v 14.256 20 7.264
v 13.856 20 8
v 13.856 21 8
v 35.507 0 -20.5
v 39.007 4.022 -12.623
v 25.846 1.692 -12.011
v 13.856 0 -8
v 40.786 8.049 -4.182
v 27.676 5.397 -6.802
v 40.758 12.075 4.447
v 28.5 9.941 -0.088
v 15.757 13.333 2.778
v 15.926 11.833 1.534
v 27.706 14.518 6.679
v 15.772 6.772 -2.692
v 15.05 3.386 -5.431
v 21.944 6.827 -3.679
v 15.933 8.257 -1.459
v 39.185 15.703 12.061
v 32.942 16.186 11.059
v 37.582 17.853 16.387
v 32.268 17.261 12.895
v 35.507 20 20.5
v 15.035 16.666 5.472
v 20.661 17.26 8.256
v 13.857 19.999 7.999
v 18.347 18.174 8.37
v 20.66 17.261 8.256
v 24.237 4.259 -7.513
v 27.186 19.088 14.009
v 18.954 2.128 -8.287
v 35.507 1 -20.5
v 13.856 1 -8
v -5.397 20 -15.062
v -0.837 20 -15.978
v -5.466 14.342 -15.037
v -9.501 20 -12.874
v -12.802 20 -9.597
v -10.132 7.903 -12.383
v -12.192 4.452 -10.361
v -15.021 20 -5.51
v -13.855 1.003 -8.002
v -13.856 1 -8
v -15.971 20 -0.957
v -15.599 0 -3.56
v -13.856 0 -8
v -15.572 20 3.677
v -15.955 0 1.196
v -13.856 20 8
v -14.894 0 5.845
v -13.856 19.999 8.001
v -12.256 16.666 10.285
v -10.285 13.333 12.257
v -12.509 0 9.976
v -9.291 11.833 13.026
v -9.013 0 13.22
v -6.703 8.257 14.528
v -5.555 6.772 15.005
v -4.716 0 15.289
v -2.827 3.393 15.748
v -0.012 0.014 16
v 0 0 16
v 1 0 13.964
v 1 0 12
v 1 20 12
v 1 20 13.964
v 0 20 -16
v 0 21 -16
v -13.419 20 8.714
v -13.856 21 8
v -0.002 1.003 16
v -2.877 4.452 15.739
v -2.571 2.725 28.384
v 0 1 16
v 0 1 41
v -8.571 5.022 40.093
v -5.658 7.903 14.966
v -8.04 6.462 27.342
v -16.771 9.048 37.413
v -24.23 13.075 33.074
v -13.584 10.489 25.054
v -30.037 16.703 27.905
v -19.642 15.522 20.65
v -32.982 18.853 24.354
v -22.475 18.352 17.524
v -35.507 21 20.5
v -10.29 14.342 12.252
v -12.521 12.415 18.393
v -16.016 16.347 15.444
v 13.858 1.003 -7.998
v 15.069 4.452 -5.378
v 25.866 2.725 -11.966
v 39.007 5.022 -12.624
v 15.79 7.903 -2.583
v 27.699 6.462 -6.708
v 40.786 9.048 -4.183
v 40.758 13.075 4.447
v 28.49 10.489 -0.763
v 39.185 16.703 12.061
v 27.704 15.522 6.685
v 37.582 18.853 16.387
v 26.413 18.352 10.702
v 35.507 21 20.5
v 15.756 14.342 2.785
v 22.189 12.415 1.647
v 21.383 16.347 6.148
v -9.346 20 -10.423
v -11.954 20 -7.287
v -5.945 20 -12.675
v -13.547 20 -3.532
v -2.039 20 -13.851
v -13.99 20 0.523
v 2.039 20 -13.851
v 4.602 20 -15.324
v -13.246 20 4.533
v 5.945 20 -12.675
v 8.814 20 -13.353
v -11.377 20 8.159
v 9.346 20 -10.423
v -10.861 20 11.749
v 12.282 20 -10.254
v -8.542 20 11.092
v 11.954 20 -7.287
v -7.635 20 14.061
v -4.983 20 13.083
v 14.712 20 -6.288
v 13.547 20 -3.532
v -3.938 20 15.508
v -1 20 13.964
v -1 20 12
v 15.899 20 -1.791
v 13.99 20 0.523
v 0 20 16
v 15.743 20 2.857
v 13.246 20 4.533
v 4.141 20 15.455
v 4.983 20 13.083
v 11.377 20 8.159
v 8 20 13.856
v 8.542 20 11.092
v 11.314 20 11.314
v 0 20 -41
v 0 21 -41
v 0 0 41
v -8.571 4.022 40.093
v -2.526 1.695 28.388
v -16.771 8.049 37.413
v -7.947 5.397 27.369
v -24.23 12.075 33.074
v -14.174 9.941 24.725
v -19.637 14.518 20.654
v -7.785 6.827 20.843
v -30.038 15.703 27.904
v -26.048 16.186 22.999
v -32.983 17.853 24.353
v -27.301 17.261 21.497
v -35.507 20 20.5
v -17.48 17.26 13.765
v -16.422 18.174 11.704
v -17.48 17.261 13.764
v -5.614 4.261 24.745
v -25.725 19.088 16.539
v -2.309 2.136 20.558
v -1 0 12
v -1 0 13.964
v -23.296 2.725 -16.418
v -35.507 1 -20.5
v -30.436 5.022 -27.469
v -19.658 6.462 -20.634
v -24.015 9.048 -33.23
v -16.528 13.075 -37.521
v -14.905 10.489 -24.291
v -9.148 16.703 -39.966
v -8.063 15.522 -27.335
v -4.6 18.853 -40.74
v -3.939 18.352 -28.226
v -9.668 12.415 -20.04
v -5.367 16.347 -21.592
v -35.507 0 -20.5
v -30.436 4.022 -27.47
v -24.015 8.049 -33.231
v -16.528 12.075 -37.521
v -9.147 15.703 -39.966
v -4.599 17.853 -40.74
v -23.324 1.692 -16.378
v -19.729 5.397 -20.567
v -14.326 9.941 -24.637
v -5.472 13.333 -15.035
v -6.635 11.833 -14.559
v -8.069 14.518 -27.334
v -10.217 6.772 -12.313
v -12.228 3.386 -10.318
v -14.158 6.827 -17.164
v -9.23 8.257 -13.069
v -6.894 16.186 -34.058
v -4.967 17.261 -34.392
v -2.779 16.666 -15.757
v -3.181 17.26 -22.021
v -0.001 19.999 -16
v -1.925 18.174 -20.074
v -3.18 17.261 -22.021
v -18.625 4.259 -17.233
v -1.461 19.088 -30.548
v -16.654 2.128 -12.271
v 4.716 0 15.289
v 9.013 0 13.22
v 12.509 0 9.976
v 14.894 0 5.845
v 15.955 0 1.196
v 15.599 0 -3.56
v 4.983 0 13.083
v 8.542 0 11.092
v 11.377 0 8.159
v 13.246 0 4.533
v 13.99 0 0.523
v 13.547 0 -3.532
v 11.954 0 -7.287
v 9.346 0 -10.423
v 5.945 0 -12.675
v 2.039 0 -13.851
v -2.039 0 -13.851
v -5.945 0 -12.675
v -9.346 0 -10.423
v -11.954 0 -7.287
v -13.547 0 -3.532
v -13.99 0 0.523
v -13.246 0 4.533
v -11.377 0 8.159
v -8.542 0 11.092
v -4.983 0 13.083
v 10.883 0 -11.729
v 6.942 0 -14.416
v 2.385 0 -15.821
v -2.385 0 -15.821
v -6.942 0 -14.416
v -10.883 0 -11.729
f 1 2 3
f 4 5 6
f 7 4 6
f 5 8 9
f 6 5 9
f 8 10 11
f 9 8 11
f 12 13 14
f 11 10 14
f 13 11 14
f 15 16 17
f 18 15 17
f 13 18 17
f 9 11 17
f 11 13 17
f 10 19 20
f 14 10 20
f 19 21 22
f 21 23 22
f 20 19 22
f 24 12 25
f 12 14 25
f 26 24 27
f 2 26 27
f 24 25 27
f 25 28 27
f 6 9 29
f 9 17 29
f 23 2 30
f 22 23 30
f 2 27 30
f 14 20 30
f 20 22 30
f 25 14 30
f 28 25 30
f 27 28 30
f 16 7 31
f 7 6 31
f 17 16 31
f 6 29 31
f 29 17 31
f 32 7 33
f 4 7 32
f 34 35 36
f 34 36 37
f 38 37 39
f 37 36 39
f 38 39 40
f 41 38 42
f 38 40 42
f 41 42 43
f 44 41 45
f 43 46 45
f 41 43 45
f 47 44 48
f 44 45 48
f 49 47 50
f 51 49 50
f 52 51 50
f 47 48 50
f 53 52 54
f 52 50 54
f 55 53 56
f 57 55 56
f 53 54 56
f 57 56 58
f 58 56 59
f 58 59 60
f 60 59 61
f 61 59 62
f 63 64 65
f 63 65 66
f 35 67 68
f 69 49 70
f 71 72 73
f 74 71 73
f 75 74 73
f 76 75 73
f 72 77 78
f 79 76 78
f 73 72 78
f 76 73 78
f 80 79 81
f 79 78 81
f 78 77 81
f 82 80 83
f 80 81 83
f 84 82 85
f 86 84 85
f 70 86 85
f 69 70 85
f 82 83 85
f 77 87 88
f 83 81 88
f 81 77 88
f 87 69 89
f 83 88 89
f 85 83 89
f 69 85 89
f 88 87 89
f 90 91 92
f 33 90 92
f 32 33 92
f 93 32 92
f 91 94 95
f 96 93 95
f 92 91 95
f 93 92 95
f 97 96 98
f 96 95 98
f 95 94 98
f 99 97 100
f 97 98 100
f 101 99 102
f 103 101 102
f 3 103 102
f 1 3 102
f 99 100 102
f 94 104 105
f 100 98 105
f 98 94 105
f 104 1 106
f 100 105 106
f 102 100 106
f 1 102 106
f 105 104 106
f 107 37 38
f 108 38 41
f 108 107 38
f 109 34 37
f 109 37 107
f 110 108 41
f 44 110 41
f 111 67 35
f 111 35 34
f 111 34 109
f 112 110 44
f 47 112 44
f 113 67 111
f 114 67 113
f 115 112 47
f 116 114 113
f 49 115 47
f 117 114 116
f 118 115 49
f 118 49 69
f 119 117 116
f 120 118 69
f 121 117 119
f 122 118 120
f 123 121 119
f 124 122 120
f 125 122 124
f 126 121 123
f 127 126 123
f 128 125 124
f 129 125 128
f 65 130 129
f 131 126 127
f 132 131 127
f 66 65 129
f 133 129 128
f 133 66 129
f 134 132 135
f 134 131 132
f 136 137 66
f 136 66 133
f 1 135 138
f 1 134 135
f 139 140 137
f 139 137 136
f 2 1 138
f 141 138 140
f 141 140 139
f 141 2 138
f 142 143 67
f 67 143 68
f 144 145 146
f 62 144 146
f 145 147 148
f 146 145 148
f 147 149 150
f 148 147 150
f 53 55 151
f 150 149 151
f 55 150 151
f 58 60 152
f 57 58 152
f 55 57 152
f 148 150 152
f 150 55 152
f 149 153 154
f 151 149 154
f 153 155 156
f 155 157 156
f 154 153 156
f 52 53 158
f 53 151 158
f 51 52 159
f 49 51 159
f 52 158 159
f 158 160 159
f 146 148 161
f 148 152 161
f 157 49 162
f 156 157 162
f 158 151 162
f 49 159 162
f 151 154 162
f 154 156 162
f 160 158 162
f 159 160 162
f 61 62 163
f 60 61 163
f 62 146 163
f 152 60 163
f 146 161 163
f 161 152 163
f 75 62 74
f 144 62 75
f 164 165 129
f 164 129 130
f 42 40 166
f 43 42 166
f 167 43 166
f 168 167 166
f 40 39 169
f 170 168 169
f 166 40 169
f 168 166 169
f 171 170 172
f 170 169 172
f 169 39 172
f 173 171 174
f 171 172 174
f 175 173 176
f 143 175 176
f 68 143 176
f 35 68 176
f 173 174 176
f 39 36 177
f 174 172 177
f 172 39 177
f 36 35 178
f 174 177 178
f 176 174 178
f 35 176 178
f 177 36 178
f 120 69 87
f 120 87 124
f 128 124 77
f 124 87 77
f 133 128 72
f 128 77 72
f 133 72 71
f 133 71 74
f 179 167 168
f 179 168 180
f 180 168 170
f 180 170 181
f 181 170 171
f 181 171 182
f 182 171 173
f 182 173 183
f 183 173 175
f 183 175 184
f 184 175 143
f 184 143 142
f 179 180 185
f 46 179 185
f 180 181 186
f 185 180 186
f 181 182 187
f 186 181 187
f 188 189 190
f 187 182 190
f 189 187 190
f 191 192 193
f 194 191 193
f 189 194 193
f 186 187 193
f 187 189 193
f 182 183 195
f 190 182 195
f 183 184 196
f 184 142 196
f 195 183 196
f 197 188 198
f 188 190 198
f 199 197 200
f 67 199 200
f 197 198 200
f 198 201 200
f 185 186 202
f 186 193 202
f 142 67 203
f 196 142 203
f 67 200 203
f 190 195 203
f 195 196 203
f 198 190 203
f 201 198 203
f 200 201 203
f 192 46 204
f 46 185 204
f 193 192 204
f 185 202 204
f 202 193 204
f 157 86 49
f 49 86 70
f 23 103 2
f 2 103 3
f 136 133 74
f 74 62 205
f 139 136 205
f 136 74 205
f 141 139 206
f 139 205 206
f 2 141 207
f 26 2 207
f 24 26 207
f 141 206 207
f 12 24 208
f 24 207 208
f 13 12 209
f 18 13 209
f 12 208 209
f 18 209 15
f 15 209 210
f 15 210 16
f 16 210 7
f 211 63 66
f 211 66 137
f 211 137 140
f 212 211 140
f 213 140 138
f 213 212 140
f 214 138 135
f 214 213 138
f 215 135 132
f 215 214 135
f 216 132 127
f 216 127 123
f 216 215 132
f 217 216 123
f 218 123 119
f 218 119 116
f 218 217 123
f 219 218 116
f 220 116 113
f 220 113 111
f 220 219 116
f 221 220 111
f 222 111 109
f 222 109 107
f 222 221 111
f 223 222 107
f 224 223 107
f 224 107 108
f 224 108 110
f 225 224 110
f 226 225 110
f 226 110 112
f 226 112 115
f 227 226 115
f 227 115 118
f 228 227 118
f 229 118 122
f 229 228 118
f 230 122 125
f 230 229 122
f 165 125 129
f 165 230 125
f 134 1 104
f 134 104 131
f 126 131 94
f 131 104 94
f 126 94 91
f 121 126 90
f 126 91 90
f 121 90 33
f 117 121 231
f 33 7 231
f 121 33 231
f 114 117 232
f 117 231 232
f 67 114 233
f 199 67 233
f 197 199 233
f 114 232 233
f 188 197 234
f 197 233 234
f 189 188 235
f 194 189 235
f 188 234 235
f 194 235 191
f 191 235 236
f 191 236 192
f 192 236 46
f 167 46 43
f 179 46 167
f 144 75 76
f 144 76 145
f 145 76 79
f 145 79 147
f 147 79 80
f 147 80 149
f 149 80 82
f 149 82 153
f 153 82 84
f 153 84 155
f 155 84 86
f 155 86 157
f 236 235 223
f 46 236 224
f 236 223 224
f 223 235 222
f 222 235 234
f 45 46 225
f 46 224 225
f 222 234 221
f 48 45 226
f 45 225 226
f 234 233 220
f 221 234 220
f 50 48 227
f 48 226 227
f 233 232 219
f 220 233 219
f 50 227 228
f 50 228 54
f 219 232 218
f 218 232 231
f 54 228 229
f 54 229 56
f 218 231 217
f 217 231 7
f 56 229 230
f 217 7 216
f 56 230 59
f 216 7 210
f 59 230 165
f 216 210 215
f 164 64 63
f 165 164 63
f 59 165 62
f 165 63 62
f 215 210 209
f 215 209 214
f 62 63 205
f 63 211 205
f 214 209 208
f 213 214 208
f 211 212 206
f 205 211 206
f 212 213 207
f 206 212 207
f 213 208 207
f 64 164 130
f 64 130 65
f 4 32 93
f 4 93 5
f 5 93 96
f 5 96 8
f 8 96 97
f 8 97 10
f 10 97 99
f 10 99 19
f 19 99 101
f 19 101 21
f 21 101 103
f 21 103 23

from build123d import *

# Parameters (mm, degrees)
SKETCH1_R           = 16
BOSS_EXTRUDE1_DEPTH = 20
SKETCH3_W           = 25
SKETCH3_H           = 1
CIRPATTERN1_COUNT   = 3


with BuildPart() as part:
    # Sketch1 → Boss-Extrude1 (new body)
    with BuildSketch(Plane(origin=(0, 0, 0), x_dir=(1, 0, 0), z_dir=(0, 1, 0))):
        with Locations(Location((0, 0, 0), (0, 0, 270))):
            Circle(SKETCH1_R)
        with BuildLine():
            Line((-1, -12), (1, -12))
            Line((1, -12), (1, -13.964240044))
            ThreePointArc((1, -13.964240044), (0, 14), (-1, -13.964240044))
            Line((-1, -13.964240044), (-1, -12))
        make_face(mode=Mode.SUBTRACT)
    extrude(amount=BOSS_EXTRUDE1_DEPTH)

    # Sweep1: sweep along a curve in space
    with BuildLine() as sweep1_path:
        add(Edge.make_bspline(
            [(0, 0, 16), (-1.857798397, 2.217583486, 16), (-5.586575728, 6.669449908, 15.343093774), (-10.494221117, 13.330550092, 12.509663387), (-12.927507262, 17.782416514, 9.608900607), (-13.856406461, 20, 8)],
            knots=[0, 0, 0, 0, 0.333333333, 0.666666667, 1, 1, 1, 1], degree=3))
    with BuildLine() as sweep1_axis:
        Line((0, 0, 0), (0, 20, 0))
    # Sketch3 → Sweep1 (sweep)
    with BuildSketch(Plane(origin=(0, 0, 0), x_dir=(0, 0, -1), z_dir=(1, 0, 0))):
        with Locations((-28.5, 0.5)):
            Rectangle(SKETCH3_W, SKETCH3_H)
    sweep1 = sweep(path=sweep1_path.line, binormal=sweep1_axis.edges()[0])

    # CirPattern1: Sweep1 ×3 about axis
    cirpattern1_axis = Axis((0, -1.105625, 0), (0, 1, 0))
    for i in range(1, CIRPATTERN1_COUNT):
        add(sweep1.rotate(cirpattern1_axis, i * 360 / CIRPATTERN1_COUNT))


solid = part.part
